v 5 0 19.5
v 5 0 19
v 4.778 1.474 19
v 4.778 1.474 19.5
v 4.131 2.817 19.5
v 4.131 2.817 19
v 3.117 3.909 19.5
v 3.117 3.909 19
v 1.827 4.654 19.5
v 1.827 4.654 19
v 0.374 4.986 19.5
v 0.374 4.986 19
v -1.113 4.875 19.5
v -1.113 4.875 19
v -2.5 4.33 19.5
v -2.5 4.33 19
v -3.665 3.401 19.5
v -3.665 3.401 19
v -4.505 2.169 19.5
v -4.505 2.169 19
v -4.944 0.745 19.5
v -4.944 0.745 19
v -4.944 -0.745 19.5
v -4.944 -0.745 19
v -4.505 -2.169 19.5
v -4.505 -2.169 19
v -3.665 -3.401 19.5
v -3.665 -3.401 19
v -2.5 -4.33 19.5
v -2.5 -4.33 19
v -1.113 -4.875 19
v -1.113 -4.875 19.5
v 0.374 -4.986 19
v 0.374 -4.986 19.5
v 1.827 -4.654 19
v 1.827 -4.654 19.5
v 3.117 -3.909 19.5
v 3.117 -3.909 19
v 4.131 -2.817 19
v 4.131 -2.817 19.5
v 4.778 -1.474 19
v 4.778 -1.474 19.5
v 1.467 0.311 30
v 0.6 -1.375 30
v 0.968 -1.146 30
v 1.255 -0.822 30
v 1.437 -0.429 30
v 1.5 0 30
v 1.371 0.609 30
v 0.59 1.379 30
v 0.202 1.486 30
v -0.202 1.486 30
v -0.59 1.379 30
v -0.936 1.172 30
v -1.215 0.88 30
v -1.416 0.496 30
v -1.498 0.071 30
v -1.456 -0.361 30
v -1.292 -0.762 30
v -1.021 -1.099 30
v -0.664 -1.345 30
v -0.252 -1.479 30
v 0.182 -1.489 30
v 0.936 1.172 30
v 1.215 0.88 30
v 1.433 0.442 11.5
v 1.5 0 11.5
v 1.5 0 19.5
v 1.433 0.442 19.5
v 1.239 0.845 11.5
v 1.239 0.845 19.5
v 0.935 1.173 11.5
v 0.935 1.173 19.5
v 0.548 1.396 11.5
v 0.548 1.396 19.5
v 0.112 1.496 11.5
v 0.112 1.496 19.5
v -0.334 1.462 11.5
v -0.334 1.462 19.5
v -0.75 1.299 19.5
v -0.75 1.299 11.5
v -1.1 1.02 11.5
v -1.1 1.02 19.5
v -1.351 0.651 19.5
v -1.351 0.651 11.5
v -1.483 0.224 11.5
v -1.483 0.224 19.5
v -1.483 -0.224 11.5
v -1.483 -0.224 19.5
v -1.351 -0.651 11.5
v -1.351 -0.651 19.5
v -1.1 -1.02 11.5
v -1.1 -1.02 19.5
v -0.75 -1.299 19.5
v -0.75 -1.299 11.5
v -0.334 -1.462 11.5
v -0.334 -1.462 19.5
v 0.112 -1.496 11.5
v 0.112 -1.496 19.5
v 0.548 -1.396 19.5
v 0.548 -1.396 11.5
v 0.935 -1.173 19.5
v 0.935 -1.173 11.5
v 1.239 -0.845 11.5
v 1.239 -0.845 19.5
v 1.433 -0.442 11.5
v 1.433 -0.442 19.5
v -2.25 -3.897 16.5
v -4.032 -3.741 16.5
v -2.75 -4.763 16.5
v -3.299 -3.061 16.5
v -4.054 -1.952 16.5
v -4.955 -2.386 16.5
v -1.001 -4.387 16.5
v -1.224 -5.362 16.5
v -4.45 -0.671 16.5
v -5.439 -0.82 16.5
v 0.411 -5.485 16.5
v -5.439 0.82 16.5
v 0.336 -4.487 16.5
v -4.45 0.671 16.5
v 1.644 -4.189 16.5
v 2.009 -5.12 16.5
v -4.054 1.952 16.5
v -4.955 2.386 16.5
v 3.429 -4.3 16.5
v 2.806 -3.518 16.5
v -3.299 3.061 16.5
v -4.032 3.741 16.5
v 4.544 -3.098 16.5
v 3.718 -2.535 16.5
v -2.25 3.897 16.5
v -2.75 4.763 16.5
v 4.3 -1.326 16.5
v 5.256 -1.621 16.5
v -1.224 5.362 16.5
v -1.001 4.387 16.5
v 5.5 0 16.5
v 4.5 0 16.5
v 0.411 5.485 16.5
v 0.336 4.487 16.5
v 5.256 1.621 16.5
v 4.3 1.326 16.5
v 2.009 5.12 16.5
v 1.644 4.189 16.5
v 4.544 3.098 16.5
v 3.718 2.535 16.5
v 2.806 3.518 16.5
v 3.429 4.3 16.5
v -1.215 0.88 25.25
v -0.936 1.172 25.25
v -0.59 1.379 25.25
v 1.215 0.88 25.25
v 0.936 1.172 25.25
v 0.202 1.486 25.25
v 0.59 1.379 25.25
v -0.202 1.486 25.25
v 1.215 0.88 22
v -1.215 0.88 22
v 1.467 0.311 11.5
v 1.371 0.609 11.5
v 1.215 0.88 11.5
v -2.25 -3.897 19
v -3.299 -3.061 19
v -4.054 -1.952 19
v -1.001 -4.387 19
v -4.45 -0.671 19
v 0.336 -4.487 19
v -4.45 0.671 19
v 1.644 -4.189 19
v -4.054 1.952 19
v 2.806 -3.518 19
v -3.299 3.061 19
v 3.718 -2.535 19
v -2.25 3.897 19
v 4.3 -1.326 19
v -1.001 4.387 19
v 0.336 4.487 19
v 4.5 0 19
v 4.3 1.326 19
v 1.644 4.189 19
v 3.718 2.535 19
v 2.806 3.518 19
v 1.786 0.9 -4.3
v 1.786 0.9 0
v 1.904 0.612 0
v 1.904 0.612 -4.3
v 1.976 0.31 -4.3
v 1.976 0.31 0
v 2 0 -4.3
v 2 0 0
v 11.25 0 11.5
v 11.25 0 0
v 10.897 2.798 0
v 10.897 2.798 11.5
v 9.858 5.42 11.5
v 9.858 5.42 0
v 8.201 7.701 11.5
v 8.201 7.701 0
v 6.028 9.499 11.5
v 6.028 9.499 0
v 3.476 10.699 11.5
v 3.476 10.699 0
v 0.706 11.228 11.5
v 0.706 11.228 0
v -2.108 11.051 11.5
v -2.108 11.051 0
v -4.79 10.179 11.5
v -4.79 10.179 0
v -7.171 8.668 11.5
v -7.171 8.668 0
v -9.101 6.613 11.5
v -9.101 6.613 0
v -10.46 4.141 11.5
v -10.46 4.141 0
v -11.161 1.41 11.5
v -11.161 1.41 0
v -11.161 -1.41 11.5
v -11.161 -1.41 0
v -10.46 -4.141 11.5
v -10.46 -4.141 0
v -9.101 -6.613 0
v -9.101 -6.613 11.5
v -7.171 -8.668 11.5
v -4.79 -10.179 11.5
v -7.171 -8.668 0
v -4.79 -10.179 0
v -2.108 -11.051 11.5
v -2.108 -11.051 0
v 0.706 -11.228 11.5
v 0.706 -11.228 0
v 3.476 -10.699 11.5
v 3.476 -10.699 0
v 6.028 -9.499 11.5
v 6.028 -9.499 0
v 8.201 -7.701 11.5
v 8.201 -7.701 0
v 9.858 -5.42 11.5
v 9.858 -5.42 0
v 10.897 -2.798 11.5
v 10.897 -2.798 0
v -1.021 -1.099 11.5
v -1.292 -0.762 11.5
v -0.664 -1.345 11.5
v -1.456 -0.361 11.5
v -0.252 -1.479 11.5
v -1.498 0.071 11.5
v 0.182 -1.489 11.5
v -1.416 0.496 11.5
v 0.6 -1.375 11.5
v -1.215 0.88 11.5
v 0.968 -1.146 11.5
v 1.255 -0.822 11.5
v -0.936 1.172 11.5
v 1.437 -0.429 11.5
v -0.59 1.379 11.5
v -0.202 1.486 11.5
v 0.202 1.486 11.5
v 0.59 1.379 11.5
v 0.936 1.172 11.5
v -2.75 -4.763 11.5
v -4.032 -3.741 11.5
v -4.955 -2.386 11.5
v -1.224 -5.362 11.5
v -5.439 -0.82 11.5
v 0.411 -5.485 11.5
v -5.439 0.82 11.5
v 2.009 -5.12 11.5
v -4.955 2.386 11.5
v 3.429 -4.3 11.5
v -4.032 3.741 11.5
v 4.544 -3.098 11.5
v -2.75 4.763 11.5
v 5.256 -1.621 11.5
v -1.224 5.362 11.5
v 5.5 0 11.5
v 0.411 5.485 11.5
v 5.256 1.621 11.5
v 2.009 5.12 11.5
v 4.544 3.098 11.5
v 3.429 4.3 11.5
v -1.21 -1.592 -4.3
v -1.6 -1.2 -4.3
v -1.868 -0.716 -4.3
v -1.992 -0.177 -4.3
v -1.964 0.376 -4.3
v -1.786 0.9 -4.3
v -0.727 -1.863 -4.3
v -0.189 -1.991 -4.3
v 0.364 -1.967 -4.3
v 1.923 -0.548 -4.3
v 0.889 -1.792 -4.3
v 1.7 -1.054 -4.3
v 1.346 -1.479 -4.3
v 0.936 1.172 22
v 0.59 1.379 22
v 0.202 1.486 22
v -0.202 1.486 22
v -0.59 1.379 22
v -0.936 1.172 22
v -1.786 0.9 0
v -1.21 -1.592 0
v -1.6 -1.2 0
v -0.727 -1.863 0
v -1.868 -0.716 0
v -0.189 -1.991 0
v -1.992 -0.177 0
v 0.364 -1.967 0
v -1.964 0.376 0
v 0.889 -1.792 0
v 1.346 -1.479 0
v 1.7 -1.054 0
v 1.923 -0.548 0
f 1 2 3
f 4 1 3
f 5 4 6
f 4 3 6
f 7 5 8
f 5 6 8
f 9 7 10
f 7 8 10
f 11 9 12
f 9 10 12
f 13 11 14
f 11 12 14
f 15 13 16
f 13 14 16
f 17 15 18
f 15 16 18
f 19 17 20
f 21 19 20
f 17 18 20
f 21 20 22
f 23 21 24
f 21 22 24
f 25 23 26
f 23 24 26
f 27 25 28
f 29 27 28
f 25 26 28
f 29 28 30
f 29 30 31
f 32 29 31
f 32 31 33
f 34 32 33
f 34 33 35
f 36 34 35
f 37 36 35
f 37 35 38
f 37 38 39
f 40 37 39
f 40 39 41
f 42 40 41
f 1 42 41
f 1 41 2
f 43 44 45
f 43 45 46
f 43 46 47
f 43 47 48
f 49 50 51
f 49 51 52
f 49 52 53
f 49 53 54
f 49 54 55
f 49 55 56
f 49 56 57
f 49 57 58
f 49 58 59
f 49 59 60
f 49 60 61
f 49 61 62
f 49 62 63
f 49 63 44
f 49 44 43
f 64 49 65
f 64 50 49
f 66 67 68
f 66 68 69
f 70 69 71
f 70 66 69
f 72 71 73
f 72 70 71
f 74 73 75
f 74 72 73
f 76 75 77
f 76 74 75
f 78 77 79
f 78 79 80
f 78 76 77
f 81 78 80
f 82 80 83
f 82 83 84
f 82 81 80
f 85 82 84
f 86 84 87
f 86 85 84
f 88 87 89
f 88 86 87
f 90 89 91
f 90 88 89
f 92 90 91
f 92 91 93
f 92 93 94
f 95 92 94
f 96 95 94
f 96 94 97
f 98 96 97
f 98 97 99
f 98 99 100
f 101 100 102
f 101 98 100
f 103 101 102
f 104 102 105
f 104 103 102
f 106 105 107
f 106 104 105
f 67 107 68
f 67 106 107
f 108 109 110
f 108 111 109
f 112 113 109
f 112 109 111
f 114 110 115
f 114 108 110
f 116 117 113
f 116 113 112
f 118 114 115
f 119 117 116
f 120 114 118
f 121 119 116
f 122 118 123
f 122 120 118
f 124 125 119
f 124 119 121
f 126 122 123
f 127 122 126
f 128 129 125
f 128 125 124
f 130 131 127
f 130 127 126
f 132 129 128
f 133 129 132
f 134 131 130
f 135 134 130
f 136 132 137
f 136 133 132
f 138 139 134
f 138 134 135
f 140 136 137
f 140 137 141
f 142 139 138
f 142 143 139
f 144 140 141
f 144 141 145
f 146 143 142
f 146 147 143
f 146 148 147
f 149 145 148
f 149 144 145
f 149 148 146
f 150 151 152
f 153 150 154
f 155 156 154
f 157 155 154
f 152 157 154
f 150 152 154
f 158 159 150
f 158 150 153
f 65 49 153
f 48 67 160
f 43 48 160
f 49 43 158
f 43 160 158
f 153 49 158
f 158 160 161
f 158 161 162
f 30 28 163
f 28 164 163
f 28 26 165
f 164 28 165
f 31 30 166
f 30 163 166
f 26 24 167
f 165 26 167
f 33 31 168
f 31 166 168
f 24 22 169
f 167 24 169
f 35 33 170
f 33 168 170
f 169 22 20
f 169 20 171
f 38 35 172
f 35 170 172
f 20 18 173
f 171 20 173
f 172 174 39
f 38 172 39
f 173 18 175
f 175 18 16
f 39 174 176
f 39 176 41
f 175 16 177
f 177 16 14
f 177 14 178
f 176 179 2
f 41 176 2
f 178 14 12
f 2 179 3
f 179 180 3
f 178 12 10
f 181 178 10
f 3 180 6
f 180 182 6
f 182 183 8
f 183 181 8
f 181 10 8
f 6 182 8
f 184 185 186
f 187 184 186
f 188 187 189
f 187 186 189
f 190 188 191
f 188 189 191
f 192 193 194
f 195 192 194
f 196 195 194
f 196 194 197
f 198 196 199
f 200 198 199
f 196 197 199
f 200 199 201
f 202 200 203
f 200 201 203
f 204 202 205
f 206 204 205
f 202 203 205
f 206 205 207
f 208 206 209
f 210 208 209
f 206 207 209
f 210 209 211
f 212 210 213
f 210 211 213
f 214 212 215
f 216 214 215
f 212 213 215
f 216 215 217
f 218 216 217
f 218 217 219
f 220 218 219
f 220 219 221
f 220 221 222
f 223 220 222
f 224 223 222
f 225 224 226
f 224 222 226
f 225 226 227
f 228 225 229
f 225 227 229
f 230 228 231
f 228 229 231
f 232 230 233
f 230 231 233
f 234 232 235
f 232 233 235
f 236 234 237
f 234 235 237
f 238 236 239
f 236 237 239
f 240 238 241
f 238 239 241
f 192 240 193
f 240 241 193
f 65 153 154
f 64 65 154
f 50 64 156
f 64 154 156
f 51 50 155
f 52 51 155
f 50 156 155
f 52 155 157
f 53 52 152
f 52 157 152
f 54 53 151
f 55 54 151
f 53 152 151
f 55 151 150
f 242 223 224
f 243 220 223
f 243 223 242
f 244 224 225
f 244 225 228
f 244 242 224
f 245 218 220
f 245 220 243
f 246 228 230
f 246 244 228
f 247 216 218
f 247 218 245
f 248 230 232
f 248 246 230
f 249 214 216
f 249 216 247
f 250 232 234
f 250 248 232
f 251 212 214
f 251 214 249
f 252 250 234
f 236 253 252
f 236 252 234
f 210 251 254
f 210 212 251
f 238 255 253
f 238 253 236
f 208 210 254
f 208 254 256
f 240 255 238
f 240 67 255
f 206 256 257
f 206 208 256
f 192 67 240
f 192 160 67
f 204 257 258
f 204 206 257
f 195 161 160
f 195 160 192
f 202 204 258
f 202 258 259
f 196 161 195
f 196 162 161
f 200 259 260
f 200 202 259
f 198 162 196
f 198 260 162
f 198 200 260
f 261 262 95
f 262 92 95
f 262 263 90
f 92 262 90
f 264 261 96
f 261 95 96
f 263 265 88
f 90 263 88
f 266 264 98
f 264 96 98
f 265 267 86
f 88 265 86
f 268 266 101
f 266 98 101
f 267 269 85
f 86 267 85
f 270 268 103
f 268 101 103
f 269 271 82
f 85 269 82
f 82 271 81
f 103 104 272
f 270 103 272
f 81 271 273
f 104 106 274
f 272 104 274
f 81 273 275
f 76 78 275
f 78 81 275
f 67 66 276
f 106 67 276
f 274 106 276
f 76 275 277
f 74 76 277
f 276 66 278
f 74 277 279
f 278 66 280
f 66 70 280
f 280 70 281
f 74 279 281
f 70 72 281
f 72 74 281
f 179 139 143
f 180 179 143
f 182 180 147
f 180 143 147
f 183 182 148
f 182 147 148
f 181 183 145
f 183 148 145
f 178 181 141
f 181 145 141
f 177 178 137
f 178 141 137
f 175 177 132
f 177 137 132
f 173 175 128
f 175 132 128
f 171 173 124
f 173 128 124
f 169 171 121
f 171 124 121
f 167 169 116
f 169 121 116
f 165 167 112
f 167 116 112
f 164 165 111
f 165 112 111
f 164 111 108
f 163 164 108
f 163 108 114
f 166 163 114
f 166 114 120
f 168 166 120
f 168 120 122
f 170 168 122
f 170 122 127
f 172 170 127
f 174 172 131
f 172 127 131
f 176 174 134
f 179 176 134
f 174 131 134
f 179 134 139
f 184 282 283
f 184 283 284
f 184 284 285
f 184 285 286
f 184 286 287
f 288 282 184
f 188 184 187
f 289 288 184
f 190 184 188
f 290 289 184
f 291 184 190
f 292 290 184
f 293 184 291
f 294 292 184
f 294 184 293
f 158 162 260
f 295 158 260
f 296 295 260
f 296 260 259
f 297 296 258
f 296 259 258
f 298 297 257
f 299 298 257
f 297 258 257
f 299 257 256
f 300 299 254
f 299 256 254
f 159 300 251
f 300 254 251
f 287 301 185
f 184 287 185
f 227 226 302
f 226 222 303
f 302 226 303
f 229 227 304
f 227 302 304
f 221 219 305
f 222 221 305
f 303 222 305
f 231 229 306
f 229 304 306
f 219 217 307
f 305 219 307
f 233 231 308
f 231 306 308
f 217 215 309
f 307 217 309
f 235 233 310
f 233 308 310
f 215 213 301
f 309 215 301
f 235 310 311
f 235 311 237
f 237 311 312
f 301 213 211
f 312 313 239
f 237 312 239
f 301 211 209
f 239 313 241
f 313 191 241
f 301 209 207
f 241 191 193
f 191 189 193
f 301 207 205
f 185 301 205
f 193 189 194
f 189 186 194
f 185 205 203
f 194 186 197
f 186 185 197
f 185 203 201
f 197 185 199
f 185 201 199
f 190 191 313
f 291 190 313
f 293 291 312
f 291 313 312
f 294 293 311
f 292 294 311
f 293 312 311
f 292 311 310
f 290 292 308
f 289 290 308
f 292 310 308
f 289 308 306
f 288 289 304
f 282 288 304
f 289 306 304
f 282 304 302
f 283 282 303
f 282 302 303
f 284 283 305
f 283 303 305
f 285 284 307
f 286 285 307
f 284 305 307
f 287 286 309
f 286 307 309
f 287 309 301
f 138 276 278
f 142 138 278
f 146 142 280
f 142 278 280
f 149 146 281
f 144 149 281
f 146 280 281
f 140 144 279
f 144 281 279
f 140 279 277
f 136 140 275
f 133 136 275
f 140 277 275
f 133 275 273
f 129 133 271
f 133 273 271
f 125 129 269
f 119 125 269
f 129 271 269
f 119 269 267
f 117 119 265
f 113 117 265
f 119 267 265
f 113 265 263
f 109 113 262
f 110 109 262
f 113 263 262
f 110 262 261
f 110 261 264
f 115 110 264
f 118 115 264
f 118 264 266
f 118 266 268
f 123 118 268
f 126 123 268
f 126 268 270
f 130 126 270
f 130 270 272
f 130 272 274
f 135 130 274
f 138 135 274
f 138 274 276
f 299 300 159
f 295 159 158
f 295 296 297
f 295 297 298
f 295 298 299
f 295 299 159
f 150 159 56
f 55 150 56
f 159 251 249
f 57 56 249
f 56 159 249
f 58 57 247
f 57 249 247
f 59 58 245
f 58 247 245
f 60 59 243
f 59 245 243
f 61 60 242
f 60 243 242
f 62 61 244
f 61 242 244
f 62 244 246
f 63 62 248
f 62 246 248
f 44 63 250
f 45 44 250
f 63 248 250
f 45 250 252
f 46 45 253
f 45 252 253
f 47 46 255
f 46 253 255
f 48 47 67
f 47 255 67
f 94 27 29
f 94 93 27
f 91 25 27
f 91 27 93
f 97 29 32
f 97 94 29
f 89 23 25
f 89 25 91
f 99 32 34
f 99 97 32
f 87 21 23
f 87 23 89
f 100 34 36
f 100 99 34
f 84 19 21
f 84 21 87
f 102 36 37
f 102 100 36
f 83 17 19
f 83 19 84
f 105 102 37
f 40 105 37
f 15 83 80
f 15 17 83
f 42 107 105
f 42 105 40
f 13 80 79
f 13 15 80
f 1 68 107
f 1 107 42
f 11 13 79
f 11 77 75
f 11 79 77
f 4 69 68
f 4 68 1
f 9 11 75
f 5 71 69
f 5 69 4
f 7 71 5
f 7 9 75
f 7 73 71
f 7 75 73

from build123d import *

# Parameters (mm, degrees)
F0_R     = 11.25
F1_DEPTH = 11.5
F2_DEPTH = 30
F3_START = 22
F3_DEPTH = 3.25
F4_R     = 5.5
F4_R_2   = 5
F4_R_3   = 4.5
F4_R_4   = 1.5
F5_DEPTH = 8
F6_START = 5
F6_DEPTH = 3
F7_START = 5
F7_DEPTH = 2.5
F9_DEPTH = 4.3


with BuildPart() as f1:
    # F0 (on Top) → F1 (new body)
    with BuildSketch(Plane.XY):
        Circle(F0_R)
        with BuildLine():
            ThreePointArc((1.2147427711, 0.88), (1.4269047194, 0.4625396433), (1.5, 0))
            ThreePointArc((1.5, 0), (-0.4625396433, -1.4269047194), (-1.2147427711, 0.88))
            ThreePointArc((-1.2147427711, 0.88), (0, 1.5), (1.2147427711, 0.88))
        make_face(mode=Mode.SUBTRACT)
    extrude(amount=F1_DEPTH)

    # F0 (on Top) → F2 (join)
    with BuildSketch(Plane.XY):
        with BuildLine():
            Line((-1.2147427711, 0.88), (1.2147427711, 0.88))
            ThreePointArc((1.2147427711, 0.88), (0, 1.5), (-1.2147427711, 0.88))
        make_face()
        with BuildLine():
            ThreePointArc((-1.2147427711, 0.88), (-0.4625396433, -1.4269047194), (1.5, 0))
            ThreePointArc((1.5, 0), (1.4269047194, 0.4625396433), (1.2147427711, 0.88))
            Line((1.2147427711, 0.88), (-1.2147427711, 0.88))
        make_face()
    extrude(amount=F2_DEPTH)

    # F0 (on Top) → F3 (cut)
    with BuildSketch(Plane.XY.offset(F3_START)):
        with BuildLine():
            Line((-1.2147427711, 0.88), (1.2147427711, 0.88))
            ThreePointArc((1.2147427711, 0.88), (0, 1.5), (-1.2147427711, 0.88))
        make_face()
    extrude(amount=F3_DEPTH, mode=Mode.SUBTRACT)

    # F8 (on face) → F9 (join)
    with BuildSketch(Plane(origin=(0, 0, 0), x_dir=(1, 0, 0), z_dir=(0, 0, -1))):
        with BuildLine():
            ThreePointArc((1.7860571099, -0.9), (1.9457793066, -0.4625396092), (2, 0))
            ThreePointArc((2, 0), (-0.4625396092, 1.9457793066), (-1.7860571099, -0.9))
            Line((-1.7860571099, -0.9), (1.7860571099, -0.9))
        make_face()
    extrude(amount=F9_DEPTH)


with BuildPart() as f5:
    # F4 (on face) → F5 (new body)
    with BuildSketch(Plane.XY.offset(11.5)):
        Circle(F4_R)
        Circle(F4_R_2, mode=Mode.SUBTRACT)
        Circle(F4_R_2)
        Circle(F4_R_3, mode=Mode.SUBTRACT)
        Circle(F4_R_3)
        Circle(F4_R_4, mode=Mode.SUBTRACT)
    extrude(amount=F5_DEPTH)

    # F4 (on face) → F6 (cut)
    with BuildSketch(Plane.XY.offset(11.5).offset(F6_START)):
        Circle(F4_R)
        Circle(F4_R_2, mode=Mode.SUBTRACT)
    extrude(amount=F6_DEPTH, mode=Mode.SUBTRACT)

    # F4 (on face) → F7 (cut)
    with BuildSketch(Plane.XY.offset(11.5).offset(F7_START)):
        Circle(F4_R_2)
        Circle(F4_R_3, mode=Mode.SUBTRACT)
    extrude(amount=F7_DEPTH, mode=Mode.SUBTRACT)


solid = Compound([f1.part, f5.part])
